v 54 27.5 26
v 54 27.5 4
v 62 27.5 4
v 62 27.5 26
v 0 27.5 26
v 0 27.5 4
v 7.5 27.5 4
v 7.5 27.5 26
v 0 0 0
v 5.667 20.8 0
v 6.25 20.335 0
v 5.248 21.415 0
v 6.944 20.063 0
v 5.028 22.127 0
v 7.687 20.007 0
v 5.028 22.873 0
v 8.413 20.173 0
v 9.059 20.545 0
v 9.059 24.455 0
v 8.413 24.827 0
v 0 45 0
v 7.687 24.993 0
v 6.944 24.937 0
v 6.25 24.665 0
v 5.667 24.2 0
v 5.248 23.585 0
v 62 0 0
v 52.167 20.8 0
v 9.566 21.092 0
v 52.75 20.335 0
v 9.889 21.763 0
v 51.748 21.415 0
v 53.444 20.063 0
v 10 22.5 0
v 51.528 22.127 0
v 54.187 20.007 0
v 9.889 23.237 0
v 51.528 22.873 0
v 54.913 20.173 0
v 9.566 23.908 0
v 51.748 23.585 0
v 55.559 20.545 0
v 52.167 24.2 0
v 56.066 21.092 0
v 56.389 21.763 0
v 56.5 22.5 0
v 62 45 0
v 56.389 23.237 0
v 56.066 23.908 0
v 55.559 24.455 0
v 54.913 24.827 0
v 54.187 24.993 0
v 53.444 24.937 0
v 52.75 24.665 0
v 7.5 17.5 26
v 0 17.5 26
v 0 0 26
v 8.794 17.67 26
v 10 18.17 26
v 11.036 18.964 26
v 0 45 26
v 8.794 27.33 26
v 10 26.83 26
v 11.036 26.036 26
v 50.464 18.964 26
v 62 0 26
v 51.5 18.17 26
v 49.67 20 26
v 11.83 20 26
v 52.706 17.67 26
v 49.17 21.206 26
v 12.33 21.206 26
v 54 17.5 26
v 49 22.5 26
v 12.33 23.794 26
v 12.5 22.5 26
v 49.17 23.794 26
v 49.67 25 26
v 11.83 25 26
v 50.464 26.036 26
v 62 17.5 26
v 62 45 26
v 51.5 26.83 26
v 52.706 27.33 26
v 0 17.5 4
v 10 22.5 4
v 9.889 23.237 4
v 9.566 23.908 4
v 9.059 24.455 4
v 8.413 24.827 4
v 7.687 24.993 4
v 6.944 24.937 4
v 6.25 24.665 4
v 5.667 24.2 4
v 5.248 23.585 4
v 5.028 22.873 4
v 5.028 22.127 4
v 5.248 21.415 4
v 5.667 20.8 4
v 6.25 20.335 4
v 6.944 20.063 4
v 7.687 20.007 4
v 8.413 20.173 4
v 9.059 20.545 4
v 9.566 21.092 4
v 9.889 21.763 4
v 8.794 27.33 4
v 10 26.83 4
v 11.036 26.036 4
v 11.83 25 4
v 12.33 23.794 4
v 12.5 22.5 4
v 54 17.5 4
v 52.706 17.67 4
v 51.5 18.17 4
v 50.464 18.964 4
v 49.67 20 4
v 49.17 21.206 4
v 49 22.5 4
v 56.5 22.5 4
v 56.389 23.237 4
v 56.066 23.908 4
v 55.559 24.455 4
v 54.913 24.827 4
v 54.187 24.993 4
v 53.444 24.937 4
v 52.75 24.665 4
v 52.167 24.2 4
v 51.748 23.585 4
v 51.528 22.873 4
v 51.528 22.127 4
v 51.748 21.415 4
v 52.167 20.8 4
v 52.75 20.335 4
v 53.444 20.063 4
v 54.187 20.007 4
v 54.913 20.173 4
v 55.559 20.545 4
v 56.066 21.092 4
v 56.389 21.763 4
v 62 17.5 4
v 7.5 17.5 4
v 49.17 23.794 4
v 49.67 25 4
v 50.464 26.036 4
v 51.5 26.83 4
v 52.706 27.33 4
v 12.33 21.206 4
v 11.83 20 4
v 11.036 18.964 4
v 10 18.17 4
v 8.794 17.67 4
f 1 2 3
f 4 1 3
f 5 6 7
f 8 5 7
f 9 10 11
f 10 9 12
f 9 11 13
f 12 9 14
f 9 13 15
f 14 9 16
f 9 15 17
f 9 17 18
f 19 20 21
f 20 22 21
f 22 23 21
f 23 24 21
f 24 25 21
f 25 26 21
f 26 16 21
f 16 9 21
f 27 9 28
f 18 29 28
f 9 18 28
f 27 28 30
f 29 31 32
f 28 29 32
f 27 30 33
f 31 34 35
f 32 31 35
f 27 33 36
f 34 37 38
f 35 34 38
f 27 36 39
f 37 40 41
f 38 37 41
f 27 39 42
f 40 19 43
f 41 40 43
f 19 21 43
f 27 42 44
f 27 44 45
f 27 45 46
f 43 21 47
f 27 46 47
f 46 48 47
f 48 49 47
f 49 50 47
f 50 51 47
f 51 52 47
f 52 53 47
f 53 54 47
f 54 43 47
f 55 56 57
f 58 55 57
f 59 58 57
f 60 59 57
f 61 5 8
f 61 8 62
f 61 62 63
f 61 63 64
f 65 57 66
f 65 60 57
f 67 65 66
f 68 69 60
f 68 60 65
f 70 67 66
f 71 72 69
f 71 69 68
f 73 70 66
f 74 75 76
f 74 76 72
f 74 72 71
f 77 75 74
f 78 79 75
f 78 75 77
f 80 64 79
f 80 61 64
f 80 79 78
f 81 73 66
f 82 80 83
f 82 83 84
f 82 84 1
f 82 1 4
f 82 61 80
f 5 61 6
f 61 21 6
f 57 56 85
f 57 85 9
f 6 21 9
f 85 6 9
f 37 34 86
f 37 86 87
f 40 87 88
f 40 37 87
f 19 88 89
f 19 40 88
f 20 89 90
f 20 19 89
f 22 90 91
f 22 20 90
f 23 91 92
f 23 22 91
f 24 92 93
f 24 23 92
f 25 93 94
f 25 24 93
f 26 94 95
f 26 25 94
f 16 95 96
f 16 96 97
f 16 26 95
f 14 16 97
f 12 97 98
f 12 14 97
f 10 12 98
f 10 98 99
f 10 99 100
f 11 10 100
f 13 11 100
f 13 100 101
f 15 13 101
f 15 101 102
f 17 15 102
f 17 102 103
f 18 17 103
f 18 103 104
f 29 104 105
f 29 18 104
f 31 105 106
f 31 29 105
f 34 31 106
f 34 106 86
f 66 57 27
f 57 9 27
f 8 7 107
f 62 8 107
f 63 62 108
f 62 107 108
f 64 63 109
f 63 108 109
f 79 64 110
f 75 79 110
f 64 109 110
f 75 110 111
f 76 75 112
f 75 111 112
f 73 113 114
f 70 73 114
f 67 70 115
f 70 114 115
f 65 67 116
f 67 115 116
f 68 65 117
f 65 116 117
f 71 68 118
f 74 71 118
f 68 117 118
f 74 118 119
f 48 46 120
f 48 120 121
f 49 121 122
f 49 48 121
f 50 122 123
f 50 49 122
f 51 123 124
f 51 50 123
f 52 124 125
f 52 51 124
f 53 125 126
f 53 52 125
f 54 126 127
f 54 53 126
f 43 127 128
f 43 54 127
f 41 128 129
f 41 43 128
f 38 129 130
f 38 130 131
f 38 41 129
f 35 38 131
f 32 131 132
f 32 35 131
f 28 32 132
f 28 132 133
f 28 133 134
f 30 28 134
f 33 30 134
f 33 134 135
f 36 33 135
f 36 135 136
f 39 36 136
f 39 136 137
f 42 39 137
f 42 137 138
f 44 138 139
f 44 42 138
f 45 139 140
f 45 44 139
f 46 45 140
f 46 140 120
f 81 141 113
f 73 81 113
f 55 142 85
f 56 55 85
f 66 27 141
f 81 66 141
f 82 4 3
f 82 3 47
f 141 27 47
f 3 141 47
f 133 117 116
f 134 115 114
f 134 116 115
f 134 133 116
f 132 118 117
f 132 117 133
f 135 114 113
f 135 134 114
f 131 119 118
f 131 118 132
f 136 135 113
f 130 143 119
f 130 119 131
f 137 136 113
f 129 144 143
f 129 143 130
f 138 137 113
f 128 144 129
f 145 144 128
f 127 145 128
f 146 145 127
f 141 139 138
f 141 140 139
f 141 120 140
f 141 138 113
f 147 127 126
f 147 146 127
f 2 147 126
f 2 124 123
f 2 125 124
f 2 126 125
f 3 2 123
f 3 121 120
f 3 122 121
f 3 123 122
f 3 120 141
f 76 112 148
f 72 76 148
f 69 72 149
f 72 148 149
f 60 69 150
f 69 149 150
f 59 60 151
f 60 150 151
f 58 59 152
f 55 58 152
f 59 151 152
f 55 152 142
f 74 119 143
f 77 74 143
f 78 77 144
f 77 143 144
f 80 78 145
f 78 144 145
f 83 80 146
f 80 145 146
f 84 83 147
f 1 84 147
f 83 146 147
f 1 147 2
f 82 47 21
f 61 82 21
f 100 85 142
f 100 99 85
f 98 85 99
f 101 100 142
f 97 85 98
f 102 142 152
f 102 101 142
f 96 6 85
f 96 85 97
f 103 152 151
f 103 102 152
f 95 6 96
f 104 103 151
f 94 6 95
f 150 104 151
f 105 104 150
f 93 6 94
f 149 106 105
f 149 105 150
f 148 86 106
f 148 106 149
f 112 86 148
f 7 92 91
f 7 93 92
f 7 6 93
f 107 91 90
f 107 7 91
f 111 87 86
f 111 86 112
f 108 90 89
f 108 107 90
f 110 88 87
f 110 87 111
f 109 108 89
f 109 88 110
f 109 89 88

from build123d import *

# Parameters (mm, degrees)
F0_W     = 62
F0_H     = 45
F0_R     = 2.5
F1_DEPTH = 4
F3_DEPTH = 22


with BuildPart() as f1:
    # F0 (on Top) → F1 (new body)
    with BuildSketch(Plane.XY):
        with Locations((31, 22.5)):
            Rectangle(F0_W, F0_H)
        with Locations((7.5, 22.5)):
            Circle(F0_R, mode=Mode.SUBTRACT)
        with Locations((54, 22.5)):
            Circle(F0_R, mode=Mode.SUBTRACT)
    extrude(amount=F1_DEPTH)

    # F2 (on face) → F3 (join)
    with BuildSketch(Plane.XY.offset(4)):
        with BuildLine():
            Line((62, 45), (0, 45))
            Line((0, 45), (0, 27.5))
            Line((0, 27.5), (7.5, 27.5))
            ThreePointArc((7.5, 27.5), (11.035534, 26.035534), (12.5, 22.5))
            ThreePointArc((12.5, 22.5), (11.035534, 18.964466), (7.5, 17.5))
            Line((7.5, 17.5), (0, 17.5))
            Line((0, 17.5), (0, 0))
            Line((0, 0), (62, 0))
            Line((62, 0), (62, 17.5))
            Line((62, 17.5), (54, 17.5))
            ThreePointArc((54, 17.5), (50.464466, 18.964466), (49, 22.5))
            ThreePointArc((49, 22.5), (50.464466, 26.035534), (54, 27.5))
            Line((54, 27.5), (62, 27.5))
            Line((62, 27.5), (62, 45))
        make_face()
    extrude(amount=F3_DEPTH)


solid = f1.part
